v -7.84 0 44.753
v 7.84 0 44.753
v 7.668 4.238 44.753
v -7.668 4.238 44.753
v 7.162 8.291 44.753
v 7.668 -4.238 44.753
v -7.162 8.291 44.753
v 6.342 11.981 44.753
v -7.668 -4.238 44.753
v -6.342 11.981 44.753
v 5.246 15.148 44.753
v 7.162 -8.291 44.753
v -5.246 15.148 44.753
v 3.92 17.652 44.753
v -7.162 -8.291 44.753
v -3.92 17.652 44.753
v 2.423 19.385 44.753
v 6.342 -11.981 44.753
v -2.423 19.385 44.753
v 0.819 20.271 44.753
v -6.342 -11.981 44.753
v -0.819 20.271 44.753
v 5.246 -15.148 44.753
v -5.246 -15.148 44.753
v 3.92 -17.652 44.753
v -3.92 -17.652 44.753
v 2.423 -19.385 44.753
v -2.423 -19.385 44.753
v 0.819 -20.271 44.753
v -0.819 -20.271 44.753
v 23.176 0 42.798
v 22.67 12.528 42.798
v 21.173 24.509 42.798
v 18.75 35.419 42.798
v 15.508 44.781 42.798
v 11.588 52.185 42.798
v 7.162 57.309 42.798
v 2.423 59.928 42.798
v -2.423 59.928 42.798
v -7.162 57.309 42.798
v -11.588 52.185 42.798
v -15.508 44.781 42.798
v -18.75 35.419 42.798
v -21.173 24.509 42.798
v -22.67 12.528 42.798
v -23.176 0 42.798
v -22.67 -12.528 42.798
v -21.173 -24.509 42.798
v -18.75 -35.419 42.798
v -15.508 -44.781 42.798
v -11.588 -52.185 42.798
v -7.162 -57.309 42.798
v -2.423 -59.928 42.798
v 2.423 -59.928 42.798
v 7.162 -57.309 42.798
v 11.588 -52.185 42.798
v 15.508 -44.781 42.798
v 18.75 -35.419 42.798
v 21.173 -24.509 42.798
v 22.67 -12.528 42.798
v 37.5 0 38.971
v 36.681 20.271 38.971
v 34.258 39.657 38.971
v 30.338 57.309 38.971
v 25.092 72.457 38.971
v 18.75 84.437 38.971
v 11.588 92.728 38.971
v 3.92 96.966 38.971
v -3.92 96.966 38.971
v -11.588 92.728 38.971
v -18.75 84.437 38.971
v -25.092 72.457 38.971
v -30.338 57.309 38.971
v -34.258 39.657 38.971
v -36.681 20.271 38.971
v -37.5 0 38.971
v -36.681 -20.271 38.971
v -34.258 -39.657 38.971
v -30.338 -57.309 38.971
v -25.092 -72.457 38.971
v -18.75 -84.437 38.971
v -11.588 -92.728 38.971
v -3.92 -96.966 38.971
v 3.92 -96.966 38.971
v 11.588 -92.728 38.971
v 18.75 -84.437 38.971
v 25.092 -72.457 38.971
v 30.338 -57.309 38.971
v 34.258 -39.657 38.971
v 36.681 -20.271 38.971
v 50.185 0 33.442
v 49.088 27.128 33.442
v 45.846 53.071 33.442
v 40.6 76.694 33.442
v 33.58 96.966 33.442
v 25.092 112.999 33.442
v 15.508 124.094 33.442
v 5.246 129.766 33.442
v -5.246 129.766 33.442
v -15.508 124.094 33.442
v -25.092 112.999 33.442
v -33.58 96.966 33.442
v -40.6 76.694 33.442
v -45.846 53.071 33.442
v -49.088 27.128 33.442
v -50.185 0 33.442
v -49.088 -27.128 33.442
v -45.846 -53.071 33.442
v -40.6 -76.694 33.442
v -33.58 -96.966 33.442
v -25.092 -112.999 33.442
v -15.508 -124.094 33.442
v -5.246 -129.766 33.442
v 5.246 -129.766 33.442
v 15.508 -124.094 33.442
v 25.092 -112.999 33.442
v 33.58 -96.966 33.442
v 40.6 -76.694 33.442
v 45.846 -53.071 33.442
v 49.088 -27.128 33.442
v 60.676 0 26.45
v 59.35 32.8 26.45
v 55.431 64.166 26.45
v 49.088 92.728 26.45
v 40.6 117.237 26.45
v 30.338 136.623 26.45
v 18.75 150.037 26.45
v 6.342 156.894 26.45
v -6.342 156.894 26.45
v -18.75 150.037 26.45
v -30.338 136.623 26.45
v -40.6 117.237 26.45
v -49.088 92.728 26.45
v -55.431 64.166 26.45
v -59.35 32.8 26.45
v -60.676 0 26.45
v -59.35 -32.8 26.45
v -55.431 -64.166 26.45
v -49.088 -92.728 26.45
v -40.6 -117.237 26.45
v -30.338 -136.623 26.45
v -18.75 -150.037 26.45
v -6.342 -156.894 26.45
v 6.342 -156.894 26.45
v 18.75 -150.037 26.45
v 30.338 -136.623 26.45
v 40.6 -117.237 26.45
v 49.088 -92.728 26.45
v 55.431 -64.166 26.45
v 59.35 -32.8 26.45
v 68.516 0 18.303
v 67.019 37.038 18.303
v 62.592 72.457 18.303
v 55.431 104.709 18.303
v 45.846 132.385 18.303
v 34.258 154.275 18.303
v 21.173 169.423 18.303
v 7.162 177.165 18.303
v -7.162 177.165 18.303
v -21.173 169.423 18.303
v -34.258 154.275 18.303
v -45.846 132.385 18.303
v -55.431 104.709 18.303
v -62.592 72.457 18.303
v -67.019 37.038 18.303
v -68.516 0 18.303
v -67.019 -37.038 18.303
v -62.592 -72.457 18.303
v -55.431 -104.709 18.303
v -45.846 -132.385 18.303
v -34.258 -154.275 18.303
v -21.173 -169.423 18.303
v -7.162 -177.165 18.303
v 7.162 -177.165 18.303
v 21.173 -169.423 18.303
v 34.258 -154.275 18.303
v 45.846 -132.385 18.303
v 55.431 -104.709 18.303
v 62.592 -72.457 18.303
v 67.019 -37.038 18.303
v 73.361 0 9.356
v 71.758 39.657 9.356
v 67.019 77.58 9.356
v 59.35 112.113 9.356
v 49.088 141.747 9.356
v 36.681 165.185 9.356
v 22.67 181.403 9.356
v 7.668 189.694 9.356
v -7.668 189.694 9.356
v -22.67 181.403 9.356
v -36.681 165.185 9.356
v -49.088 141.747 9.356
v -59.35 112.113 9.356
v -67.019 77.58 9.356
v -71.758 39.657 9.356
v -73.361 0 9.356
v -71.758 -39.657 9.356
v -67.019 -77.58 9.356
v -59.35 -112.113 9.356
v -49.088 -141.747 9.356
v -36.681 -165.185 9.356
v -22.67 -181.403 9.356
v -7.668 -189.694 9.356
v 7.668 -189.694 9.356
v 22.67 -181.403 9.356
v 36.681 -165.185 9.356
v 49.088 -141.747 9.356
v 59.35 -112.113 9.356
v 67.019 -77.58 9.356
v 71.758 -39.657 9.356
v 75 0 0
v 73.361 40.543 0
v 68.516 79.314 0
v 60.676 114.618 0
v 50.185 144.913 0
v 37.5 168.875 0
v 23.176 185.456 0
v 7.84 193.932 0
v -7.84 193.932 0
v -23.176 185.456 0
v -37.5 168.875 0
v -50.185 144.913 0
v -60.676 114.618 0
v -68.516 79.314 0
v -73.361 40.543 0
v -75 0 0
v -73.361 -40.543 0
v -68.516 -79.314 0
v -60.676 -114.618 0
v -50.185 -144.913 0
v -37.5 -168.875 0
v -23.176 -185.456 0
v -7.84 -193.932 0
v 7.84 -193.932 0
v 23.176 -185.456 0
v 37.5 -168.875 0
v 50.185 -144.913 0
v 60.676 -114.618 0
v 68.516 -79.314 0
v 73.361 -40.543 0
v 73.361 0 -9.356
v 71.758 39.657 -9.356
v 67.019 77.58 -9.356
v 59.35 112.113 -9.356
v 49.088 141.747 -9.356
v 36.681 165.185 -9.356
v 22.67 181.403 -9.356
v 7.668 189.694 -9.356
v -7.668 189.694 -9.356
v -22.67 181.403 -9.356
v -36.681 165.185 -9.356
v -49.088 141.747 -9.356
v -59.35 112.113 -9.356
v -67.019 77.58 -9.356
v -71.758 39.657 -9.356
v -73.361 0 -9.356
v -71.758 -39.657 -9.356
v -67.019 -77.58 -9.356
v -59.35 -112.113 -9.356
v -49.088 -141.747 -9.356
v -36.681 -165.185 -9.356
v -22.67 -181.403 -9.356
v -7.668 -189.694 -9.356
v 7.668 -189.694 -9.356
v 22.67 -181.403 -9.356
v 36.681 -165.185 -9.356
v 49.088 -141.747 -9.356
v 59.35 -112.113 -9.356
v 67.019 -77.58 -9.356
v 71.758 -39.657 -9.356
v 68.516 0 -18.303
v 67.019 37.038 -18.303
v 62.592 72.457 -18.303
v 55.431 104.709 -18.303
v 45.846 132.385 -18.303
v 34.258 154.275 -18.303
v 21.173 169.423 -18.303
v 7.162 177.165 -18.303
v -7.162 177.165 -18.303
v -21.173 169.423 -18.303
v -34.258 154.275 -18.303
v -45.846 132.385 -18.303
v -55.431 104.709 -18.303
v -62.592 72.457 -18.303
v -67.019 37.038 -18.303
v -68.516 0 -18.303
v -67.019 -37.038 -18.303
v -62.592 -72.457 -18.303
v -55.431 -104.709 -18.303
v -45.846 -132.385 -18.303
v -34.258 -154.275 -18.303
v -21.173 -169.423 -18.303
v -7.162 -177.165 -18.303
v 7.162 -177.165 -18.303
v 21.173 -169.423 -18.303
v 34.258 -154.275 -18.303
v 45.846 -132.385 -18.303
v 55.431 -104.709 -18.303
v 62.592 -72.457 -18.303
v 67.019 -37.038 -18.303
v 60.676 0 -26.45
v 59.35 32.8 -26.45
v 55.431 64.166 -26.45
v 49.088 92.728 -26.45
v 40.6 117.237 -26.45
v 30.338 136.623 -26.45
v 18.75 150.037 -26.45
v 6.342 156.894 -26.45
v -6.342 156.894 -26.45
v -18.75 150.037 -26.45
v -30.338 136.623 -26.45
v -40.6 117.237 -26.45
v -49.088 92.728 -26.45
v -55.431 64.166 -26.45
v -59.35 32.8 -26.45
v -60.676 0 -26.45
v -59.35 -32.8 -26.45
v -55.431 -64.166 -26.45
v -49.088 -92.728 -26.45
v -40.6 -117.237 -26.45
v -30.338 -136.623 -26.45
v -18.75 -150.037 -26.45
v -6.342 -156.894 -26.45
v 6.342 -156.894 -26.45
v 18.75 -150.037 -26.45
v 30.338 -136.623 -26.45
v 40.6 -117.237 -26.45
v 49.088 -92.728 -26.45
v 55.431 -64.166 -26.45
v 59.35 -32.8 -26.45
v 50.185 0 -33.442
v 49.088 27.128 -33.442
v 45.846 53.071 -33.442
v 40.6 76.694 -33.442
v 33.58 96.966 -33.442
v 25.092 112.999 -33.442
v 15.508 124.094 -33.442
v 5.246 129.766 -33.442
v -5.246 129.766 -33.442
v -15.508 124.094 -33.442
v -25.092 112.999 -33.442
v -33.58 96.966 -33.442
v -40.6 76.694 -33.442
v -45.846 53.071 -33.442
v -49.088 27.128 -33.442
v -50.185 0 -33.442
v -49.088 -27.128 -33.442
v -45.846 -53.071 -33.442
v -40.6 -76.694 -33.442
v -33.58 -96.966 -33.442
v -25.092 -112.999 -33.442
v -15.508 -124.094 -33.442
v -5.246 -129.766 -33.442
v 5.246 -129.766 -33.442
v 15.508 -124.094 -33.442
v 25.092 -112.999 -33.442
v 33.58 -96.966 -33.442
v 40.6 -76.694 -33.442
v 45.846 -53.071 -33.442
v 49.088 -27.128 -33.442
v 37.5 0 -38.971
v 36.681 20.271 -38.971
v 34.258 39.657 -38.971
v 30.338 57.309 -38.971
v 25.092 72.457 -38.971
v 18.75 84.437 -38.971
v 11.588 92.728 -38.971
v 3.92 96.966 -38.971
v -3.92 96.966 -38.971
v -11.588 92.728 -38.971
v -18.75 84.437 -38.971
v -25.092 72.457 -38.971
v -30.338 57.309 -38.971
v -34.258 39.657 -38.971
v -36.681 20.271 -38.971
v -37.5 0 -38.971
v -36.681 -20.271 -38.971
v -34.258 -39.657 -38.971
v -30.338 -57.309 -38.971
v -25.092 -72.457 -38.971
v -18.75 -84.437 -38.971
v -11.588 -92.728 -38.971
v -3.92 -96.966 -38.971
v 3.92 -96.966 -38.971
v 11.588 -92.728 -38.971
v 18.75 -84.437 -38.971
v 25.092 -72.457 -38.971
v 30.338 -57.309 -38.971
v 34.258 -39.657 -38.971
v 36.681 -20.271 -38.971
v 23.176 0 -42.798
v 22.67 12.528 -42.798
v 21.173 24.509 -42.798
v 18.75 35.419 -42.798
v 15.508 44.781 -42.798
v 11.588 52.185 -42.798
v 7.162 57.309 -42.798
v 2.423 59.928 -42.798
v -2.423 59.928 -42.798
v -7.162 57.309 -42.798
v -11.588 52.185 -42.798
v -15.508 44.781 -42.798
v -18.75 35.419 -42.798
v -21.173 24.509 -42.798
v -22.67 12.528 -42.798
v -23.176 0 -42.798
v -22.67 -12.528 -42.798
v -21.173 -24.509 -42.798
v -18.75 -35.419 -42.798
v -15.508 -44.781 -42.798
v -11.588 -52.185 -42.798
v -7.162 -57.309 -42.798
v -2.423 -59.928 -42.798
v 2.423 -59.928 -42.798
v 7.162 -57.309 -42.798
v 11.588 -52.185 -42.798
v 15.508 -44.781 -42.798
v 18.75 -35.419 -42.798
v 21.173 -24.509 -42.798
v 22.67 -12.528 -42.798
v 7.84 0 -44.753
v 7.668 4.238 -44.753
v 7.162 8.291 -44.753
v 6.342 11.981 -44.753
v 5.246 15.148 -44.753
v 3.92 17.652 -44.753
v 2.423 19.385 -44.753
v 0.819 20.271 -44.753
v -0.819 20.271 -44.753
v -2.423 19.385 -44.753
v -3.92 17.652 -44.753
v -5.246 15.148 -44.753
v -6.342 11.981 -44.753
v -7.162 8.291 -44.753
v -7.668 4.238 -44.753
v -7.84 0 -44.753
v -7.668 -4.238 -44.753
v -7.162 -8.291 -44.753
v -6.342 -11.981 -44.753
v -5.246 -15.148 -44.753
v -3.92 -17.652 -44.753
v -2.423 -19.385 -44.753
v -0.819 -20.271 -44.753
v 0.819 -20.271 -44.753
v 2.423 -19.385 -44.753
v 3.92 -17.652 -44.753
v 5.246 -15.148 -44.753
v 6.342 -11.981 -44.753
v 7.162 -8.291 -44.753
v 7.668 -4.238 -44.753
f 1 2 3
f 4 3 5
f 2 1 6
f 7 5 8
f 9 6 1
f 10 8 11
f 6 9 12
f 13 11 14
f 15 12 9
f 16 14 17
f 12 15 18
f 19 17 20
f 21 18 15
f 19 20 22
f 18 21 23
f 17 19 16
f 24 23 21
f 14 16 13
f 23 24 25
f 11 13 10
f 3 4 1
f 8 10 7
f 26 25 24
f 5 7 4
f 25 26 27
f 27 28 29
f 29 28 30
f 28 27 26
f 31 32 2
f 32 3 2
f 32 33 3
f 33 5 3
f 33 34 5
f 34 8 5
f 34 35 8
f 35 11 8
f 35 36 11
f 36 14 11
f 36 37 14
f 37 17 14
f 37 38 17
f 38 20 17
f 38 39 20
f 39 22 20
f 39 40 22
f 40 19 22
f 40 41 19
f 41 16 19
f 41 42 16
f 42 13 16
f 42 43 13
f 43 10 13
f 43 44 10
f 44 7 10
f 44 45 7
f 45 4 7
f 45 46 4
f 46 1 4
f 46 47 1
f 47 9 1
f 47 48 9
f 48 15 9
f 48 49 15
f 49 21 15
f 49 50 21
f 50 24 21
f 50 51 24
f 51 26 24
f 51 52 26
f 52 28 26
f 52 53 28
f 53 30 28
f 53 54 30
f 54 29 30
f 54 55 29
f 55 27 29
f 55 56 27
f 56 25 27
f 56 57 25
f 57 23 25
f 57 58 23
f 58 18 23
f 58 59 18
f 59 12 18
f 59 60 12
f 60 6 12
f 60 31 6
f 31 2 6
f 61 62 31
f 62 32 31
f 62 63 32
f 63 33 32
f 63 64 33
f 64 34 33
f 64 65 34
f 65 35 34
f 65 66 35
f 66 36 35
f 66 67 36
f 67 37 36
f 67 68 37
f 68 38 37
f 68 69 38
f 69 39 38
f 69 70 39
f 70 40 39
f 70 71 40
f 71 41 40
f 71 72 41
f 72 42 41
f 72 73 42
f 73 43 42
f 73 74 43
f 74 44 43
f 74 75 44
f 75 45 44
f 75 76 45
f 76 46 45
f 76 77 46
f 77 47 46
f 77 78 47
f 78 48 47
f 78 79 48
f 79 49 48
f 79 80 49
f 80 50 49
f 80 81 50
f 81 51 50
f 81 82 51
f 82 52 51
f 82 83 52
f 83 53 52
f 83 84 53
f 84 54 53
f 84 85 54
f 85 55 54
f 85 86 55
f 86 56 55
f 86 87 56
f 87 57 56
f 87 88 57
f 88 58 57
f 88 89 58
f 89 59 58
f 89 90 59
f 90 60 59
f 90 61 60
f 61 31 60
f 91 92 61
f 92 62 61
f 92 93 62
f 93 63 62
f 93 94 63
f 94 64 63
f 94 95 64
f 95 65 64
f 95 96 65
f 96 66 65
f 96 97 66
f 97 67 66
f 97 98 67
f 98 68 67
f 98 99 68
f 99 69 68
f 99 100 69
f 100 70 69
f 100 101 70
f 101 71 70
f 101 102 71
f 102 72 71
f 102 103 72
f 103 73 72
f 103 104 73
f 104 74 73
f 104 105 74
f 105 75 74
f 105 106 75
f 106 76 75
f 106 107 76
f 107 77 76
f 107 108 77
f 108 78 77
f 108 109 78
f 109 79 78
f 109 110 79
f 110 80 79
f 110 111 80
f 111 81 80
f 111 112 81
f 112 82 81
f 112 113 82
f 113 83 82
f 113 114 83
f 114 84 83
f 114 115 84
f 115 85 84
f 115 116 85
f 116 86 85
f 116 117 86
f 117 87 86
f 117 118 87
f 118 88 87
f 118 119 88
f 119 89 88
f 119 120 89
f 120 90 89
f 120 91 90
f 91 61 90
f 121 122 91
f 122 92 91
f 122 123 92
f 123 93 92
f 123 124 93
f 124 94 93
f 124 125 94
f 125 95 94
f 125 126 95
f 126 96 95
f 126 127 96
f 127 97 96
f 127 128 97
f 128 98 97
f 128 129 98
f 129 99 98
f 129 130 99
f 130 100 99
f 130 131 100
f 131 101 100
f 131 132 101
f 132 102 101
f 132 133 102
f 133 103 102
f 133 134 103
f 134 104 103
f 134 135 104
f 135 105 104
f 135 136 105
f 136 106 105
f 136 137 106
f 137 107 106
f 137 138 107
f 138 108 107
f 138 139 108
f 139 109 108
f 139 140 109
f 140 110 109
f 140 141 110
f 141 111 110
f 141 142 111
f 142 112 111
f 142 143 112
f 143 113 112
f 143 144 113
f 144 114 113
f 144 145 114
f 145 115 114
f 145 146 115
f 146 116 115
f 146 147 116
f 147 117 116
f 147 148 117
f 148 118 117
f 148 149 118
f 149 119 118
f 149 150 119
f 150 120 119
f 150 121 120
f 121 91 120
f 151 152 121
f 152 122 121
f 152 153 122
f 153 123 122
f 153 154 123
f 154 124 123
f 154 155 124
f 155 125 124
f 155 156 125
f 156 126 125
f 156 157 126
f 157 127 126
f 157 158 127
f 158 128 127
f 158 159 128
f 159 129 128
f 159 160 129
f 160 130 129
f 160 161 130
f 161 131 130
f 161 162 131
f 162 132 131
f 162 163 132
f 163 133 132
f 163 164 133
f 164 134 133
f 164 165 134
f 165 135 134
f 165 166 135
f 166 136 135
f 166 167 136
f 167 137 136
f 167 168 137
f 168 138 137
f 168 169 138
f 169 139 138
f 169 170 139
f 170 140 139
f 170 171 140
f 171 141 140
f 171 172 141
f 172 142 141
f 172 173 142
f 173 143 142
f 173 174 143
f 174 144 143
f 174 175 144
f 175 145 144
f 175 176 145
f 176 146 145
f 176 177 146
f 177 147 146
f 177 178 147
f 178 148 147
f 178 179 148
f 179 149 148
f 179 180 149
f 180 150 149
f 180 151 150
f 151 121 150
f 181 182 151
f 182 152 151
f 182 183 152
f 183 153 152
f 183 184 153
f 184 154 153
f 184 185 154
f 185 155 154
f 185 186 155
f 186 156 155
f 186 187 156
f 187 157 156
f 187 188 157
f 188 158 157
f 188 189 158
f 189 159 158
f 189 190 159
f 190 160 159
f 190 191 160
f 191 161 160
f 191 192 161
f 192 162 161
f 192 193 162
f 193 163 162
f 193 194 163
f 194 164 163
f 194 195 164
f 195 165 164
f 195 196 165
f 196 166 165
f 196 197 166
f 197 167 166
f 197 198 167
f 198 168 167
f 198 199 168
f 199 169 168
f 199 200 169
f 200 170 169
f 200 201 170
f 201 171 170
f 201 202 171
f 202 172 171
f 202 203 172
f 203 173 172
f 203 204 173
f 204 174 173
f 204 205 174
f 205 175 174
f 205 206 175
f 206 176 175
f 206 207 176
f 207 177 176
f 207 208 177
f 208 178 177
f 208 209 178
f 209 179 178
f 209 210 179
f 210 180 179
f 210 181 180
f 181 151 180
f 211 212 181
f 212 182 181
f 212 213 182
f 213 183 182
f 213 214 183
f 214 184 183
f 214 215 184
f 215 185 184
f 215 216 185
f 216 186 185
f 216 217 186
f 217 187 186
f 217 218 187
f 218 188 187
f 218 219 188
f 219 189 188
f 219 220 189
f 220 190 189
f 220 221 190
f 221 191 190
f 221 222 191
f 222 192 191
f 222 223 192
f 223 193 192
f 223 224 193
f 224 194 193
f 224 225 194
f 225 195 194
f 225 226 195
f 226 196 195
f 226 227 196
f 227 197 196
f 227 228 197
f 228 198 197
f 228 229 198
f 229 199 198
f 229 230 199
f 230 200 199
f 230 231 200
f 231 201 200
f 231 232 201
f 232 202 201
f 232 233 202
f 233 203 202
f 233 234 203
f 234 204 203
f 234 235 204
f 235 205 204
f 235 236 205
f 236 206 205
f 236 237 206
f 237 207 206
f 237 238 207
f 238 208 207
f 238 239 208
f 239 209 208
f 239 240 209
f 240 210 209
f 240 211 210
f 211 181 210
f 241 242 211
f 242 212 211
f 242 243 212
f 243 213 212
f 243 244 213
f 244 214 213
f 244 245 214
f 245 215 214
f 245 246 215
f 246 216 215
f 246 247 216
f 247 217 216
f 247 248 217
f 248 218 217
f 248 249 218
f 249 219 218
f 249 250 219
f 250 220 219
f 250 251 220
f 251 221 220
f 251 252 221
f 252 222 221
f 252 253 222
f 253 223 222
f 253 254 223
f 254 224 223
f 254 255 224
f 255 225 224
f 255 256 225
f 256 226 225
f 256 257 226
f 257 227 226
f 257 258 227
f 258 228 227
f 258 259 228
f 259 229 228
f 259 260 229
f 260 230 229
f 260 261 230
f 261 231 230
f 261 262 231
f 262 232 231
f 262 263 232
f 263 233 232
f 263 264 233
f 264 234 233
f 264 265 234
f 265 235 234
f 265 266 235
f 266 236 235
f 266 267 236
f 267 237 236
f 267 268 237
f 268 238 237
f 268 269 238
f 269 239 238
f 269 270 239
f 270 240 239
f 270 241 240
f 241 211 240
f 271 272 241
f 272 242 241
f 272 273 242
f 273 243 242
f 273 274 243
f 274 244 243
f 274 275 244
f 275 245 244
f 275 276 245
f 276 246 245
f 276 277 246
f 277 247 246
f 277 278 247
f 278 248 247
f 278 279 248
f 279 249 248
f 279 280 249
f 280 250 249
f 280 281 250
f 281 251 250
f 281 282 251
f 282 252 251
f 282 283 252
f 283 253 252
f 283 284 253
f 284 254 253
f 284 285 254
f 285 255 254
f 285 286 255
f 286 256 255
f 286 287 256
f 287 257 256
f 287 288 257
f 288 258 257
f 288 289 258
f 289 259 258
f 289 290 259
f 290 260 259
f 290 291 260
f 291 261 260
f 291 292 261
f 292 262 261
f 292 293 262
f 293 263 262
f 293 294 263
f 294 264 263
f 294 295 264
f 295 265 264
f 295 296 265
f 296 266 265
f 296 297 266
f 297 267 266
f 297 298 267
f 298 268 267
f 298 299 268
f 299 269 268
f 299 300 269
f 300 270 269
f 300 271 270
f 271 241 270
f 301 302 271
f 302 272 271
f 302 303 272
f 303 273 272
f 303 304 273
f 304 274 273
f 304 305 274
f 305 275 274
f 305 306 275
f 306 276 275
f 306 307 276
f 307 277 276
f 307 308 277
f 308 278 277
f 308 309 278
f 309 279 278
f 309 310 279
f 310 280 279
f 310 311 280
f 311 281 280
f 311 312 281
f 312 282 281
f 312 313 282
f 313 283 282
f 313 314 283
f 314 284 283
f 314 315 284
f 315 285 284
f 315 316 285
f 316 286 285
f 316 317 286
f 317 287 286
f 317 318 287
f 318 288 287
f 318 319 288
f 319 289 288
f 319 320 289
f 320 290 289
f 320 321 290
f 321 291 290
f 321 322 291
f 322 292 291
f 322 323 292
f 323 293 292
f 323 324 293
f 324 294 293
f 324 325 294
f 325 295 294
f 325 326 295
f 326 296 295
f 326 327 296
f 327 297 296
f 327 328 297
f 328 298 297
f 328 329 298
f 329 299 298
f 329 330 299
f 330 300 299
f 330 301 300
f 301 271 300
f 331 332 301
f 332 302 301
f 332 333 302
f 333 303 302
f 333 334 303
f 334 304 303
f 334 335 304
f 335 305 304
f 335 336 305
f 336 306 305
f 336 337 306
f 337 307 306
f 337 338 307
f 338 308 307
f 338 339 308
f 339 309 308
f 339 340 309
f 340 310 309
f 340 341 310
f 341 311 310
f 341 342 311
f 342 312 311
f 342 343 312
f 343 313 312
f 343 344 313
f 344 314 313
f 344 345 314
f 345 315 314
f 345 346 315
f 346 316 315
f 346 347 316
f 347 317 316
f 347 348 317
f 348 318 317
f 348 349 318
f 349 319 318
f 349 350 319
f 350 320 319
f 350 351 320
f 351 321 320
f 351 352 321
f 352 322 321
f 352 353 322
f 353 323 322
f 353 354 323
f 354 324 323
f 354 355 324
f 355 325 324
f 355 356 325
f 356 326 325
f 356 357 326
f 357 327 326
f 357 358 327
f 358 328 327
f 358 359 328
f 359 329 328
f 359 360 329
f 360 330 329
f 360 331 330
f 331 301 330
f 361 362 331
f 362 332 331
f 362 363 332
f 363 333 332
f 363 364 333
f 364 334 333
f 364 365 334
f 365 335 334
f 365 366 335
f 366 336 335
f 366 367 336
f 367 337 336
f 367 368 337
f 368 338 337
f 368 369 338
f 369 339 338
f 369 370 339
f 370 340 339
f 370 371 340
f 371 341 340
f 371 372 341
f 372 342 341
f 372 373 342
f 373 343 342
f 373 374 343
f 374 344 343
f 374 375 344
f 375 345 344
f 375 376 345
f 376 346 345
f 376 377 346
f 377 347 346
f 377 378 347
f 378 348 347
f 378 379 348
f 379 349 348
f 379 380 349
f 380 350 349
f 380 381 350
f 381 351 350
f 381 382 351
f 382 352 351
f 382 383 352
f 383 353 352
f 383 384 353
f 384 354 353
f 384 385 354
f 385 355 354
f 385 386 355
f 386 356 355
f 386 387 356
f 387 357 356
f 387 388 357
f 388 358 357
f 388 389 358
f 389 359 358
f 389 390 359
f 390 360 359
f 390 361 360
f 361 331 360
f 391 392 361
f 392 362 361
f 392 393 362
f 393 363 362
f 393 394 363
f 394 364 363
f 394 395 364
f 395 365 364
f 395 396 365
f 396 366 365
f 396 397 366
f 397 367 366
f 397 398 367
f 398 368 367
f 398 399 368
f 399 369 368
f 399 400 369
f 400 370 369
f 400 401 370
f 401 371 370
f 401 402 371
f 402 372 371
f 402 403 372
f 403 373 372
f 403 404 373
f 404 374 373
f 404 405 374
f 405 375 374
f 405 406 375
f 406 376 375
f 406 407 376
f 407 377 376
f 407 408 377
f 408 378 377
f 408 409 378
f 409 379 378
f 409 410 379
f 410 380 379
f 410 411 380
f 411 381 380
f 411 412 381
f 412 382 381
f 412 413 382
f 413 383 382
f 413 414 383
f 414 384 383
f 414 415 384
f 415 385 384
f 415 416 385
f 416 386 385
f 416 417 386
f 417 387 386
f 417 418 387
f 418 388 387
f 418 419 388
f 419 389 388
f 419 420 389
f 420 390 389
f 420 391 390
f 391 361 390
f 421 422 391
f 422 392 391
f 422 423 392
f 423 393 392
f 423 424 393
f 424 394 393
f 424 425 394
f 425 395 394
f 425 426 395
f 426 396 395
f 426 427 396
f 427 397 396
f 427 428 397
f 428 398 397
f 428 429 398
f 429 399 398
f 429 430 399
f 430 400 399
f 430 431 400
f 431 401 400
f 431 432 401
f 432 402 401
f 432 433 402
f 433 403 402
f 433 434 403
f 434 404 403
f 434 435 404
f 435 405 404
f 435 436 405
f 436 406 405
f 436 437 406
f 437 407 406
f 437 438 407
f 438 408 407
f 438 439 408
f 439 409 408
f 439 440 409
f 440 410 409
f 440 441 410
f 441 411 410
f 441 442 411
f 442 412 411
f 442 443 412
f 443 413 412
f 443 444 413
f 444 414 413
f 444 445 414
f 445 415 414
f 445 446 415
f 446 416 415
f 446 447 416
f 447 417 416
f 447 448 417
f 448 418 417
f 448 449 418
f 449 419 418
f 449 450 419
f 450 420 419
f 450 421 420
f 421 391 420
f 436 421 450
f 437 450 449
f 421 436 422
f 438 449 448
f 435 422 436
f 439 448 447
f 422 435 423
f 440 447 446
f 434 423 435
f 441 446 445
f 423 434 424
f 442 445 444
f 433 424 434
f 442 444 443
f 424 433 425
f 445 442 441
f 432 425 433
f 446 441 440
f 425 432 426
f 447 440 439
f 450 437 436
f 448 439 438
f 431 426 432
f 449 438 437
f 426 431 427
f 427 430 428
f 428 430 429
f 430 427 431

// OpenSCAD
// Generated by SolidPython 1.0.1 on 2020-07-29 00:46:46


scale(v = [5, 13, 3]) {
	sphere(r = 15);
}
/***********************************************
*********      SolidPython code:      **********
************************************************
 
# import packages: SolidPython
from solid import *
from solid.utils import *
from itertools import chain, combinations, permutations


class Resize:

    def __init__(self, scad_file):
        self.scad_file = scad_file
        #self.scad_file = import_scad(scad_file)
        # cone/cylinder param:
        self.r1 = 0
        self.r2 = 0
        self.h = 0
        # rectangular prism param:
        self.w = 0
        self.l = 0
        # ellipse param:
        self.r = 0

    # import OpenScad code (file name corresponds to shape)


    # classify shape + parameters
    def assign(self, param1, param2, param3):
        if self.scad_file == 'cone.scad':
            self.r1 = param1
            self.r2 = param2
            self.h = param3
        elif self.scad_file == 'cylinder.scad':
            self.r1 = param1
            self.r2 = param2
            self.h = param3
        elif self.scad_file == 'rectangularPrism.scad':
            self.h = param1
            self.l = param2
            self.w = param3
        else:
            self.r = param1
            self.h = param2

    # resize parameters
    def iterate(self):
        x = range(3, 20, 2)
        i = 1
        if self.scad_file == 'cone.scad':
            tempList = list(permutations(x, 2))
            for temp in tempList:
                param1 = temp[0]
                param2 = temp[1]
                filepath = 'produced_scad_files/' + 'cone' + str(param1) + '_' + str(param2) + '_' + '.scad'
                scad_render_to_file(cylinder(h=param1, r1=param2, r2=0), filepath)

        elif self.scad_file == 'cylinder.scad':
            tempList = list(permutations(x, 3))
            for temp in tempList:
                param1 = temp[0]
                param2 = temp[1]
                filepath = 'produced_scad_files/' + 'cylinder' + str(param1) + '_' + str(param2) + '_' + '.scad'
                scad_render_to_file(cylinder(h=param1, r1=param2, r2=param2), filepath)

        elif self.scad_file == 'rectangularPrism.scad':
            tempList = list(permutations(x, 3))
            for temp in tempList:
                param1 = temp[0]
                param2 = temp[1]
                param3 = temp[2]
                filepath = 'produced_scad_files/' + 'rectangularPrism' + str(param1) + '_' + str(param2) + '_' + str(
                    param3) + '.scad'
                scad_render_to_file(cube(size=(param1, param2, param3)), filepath)

        elif self.scad_file == 'ellipse.scad':
            tempList = list(permutations(x, 4))
            for temp in tempList:
                param1 = temp[0]
                param2 = temp[1]
                param3 = temp[2]
                param4 = temp[3]
                filepath = 'produced_scad_files/' + 'ellipse' + str(param1) + '_' + str(param2) + '_' + str(param3) + '_' + str(param4) + '.scad'
                scad_render_to_file(scale([param1, param2, param3])(sphere(r=param4)), filepath)

    def render_to_scadfile(self):
        scad_render_to_file(scad, 'example.scad') 
 
************************************************/
